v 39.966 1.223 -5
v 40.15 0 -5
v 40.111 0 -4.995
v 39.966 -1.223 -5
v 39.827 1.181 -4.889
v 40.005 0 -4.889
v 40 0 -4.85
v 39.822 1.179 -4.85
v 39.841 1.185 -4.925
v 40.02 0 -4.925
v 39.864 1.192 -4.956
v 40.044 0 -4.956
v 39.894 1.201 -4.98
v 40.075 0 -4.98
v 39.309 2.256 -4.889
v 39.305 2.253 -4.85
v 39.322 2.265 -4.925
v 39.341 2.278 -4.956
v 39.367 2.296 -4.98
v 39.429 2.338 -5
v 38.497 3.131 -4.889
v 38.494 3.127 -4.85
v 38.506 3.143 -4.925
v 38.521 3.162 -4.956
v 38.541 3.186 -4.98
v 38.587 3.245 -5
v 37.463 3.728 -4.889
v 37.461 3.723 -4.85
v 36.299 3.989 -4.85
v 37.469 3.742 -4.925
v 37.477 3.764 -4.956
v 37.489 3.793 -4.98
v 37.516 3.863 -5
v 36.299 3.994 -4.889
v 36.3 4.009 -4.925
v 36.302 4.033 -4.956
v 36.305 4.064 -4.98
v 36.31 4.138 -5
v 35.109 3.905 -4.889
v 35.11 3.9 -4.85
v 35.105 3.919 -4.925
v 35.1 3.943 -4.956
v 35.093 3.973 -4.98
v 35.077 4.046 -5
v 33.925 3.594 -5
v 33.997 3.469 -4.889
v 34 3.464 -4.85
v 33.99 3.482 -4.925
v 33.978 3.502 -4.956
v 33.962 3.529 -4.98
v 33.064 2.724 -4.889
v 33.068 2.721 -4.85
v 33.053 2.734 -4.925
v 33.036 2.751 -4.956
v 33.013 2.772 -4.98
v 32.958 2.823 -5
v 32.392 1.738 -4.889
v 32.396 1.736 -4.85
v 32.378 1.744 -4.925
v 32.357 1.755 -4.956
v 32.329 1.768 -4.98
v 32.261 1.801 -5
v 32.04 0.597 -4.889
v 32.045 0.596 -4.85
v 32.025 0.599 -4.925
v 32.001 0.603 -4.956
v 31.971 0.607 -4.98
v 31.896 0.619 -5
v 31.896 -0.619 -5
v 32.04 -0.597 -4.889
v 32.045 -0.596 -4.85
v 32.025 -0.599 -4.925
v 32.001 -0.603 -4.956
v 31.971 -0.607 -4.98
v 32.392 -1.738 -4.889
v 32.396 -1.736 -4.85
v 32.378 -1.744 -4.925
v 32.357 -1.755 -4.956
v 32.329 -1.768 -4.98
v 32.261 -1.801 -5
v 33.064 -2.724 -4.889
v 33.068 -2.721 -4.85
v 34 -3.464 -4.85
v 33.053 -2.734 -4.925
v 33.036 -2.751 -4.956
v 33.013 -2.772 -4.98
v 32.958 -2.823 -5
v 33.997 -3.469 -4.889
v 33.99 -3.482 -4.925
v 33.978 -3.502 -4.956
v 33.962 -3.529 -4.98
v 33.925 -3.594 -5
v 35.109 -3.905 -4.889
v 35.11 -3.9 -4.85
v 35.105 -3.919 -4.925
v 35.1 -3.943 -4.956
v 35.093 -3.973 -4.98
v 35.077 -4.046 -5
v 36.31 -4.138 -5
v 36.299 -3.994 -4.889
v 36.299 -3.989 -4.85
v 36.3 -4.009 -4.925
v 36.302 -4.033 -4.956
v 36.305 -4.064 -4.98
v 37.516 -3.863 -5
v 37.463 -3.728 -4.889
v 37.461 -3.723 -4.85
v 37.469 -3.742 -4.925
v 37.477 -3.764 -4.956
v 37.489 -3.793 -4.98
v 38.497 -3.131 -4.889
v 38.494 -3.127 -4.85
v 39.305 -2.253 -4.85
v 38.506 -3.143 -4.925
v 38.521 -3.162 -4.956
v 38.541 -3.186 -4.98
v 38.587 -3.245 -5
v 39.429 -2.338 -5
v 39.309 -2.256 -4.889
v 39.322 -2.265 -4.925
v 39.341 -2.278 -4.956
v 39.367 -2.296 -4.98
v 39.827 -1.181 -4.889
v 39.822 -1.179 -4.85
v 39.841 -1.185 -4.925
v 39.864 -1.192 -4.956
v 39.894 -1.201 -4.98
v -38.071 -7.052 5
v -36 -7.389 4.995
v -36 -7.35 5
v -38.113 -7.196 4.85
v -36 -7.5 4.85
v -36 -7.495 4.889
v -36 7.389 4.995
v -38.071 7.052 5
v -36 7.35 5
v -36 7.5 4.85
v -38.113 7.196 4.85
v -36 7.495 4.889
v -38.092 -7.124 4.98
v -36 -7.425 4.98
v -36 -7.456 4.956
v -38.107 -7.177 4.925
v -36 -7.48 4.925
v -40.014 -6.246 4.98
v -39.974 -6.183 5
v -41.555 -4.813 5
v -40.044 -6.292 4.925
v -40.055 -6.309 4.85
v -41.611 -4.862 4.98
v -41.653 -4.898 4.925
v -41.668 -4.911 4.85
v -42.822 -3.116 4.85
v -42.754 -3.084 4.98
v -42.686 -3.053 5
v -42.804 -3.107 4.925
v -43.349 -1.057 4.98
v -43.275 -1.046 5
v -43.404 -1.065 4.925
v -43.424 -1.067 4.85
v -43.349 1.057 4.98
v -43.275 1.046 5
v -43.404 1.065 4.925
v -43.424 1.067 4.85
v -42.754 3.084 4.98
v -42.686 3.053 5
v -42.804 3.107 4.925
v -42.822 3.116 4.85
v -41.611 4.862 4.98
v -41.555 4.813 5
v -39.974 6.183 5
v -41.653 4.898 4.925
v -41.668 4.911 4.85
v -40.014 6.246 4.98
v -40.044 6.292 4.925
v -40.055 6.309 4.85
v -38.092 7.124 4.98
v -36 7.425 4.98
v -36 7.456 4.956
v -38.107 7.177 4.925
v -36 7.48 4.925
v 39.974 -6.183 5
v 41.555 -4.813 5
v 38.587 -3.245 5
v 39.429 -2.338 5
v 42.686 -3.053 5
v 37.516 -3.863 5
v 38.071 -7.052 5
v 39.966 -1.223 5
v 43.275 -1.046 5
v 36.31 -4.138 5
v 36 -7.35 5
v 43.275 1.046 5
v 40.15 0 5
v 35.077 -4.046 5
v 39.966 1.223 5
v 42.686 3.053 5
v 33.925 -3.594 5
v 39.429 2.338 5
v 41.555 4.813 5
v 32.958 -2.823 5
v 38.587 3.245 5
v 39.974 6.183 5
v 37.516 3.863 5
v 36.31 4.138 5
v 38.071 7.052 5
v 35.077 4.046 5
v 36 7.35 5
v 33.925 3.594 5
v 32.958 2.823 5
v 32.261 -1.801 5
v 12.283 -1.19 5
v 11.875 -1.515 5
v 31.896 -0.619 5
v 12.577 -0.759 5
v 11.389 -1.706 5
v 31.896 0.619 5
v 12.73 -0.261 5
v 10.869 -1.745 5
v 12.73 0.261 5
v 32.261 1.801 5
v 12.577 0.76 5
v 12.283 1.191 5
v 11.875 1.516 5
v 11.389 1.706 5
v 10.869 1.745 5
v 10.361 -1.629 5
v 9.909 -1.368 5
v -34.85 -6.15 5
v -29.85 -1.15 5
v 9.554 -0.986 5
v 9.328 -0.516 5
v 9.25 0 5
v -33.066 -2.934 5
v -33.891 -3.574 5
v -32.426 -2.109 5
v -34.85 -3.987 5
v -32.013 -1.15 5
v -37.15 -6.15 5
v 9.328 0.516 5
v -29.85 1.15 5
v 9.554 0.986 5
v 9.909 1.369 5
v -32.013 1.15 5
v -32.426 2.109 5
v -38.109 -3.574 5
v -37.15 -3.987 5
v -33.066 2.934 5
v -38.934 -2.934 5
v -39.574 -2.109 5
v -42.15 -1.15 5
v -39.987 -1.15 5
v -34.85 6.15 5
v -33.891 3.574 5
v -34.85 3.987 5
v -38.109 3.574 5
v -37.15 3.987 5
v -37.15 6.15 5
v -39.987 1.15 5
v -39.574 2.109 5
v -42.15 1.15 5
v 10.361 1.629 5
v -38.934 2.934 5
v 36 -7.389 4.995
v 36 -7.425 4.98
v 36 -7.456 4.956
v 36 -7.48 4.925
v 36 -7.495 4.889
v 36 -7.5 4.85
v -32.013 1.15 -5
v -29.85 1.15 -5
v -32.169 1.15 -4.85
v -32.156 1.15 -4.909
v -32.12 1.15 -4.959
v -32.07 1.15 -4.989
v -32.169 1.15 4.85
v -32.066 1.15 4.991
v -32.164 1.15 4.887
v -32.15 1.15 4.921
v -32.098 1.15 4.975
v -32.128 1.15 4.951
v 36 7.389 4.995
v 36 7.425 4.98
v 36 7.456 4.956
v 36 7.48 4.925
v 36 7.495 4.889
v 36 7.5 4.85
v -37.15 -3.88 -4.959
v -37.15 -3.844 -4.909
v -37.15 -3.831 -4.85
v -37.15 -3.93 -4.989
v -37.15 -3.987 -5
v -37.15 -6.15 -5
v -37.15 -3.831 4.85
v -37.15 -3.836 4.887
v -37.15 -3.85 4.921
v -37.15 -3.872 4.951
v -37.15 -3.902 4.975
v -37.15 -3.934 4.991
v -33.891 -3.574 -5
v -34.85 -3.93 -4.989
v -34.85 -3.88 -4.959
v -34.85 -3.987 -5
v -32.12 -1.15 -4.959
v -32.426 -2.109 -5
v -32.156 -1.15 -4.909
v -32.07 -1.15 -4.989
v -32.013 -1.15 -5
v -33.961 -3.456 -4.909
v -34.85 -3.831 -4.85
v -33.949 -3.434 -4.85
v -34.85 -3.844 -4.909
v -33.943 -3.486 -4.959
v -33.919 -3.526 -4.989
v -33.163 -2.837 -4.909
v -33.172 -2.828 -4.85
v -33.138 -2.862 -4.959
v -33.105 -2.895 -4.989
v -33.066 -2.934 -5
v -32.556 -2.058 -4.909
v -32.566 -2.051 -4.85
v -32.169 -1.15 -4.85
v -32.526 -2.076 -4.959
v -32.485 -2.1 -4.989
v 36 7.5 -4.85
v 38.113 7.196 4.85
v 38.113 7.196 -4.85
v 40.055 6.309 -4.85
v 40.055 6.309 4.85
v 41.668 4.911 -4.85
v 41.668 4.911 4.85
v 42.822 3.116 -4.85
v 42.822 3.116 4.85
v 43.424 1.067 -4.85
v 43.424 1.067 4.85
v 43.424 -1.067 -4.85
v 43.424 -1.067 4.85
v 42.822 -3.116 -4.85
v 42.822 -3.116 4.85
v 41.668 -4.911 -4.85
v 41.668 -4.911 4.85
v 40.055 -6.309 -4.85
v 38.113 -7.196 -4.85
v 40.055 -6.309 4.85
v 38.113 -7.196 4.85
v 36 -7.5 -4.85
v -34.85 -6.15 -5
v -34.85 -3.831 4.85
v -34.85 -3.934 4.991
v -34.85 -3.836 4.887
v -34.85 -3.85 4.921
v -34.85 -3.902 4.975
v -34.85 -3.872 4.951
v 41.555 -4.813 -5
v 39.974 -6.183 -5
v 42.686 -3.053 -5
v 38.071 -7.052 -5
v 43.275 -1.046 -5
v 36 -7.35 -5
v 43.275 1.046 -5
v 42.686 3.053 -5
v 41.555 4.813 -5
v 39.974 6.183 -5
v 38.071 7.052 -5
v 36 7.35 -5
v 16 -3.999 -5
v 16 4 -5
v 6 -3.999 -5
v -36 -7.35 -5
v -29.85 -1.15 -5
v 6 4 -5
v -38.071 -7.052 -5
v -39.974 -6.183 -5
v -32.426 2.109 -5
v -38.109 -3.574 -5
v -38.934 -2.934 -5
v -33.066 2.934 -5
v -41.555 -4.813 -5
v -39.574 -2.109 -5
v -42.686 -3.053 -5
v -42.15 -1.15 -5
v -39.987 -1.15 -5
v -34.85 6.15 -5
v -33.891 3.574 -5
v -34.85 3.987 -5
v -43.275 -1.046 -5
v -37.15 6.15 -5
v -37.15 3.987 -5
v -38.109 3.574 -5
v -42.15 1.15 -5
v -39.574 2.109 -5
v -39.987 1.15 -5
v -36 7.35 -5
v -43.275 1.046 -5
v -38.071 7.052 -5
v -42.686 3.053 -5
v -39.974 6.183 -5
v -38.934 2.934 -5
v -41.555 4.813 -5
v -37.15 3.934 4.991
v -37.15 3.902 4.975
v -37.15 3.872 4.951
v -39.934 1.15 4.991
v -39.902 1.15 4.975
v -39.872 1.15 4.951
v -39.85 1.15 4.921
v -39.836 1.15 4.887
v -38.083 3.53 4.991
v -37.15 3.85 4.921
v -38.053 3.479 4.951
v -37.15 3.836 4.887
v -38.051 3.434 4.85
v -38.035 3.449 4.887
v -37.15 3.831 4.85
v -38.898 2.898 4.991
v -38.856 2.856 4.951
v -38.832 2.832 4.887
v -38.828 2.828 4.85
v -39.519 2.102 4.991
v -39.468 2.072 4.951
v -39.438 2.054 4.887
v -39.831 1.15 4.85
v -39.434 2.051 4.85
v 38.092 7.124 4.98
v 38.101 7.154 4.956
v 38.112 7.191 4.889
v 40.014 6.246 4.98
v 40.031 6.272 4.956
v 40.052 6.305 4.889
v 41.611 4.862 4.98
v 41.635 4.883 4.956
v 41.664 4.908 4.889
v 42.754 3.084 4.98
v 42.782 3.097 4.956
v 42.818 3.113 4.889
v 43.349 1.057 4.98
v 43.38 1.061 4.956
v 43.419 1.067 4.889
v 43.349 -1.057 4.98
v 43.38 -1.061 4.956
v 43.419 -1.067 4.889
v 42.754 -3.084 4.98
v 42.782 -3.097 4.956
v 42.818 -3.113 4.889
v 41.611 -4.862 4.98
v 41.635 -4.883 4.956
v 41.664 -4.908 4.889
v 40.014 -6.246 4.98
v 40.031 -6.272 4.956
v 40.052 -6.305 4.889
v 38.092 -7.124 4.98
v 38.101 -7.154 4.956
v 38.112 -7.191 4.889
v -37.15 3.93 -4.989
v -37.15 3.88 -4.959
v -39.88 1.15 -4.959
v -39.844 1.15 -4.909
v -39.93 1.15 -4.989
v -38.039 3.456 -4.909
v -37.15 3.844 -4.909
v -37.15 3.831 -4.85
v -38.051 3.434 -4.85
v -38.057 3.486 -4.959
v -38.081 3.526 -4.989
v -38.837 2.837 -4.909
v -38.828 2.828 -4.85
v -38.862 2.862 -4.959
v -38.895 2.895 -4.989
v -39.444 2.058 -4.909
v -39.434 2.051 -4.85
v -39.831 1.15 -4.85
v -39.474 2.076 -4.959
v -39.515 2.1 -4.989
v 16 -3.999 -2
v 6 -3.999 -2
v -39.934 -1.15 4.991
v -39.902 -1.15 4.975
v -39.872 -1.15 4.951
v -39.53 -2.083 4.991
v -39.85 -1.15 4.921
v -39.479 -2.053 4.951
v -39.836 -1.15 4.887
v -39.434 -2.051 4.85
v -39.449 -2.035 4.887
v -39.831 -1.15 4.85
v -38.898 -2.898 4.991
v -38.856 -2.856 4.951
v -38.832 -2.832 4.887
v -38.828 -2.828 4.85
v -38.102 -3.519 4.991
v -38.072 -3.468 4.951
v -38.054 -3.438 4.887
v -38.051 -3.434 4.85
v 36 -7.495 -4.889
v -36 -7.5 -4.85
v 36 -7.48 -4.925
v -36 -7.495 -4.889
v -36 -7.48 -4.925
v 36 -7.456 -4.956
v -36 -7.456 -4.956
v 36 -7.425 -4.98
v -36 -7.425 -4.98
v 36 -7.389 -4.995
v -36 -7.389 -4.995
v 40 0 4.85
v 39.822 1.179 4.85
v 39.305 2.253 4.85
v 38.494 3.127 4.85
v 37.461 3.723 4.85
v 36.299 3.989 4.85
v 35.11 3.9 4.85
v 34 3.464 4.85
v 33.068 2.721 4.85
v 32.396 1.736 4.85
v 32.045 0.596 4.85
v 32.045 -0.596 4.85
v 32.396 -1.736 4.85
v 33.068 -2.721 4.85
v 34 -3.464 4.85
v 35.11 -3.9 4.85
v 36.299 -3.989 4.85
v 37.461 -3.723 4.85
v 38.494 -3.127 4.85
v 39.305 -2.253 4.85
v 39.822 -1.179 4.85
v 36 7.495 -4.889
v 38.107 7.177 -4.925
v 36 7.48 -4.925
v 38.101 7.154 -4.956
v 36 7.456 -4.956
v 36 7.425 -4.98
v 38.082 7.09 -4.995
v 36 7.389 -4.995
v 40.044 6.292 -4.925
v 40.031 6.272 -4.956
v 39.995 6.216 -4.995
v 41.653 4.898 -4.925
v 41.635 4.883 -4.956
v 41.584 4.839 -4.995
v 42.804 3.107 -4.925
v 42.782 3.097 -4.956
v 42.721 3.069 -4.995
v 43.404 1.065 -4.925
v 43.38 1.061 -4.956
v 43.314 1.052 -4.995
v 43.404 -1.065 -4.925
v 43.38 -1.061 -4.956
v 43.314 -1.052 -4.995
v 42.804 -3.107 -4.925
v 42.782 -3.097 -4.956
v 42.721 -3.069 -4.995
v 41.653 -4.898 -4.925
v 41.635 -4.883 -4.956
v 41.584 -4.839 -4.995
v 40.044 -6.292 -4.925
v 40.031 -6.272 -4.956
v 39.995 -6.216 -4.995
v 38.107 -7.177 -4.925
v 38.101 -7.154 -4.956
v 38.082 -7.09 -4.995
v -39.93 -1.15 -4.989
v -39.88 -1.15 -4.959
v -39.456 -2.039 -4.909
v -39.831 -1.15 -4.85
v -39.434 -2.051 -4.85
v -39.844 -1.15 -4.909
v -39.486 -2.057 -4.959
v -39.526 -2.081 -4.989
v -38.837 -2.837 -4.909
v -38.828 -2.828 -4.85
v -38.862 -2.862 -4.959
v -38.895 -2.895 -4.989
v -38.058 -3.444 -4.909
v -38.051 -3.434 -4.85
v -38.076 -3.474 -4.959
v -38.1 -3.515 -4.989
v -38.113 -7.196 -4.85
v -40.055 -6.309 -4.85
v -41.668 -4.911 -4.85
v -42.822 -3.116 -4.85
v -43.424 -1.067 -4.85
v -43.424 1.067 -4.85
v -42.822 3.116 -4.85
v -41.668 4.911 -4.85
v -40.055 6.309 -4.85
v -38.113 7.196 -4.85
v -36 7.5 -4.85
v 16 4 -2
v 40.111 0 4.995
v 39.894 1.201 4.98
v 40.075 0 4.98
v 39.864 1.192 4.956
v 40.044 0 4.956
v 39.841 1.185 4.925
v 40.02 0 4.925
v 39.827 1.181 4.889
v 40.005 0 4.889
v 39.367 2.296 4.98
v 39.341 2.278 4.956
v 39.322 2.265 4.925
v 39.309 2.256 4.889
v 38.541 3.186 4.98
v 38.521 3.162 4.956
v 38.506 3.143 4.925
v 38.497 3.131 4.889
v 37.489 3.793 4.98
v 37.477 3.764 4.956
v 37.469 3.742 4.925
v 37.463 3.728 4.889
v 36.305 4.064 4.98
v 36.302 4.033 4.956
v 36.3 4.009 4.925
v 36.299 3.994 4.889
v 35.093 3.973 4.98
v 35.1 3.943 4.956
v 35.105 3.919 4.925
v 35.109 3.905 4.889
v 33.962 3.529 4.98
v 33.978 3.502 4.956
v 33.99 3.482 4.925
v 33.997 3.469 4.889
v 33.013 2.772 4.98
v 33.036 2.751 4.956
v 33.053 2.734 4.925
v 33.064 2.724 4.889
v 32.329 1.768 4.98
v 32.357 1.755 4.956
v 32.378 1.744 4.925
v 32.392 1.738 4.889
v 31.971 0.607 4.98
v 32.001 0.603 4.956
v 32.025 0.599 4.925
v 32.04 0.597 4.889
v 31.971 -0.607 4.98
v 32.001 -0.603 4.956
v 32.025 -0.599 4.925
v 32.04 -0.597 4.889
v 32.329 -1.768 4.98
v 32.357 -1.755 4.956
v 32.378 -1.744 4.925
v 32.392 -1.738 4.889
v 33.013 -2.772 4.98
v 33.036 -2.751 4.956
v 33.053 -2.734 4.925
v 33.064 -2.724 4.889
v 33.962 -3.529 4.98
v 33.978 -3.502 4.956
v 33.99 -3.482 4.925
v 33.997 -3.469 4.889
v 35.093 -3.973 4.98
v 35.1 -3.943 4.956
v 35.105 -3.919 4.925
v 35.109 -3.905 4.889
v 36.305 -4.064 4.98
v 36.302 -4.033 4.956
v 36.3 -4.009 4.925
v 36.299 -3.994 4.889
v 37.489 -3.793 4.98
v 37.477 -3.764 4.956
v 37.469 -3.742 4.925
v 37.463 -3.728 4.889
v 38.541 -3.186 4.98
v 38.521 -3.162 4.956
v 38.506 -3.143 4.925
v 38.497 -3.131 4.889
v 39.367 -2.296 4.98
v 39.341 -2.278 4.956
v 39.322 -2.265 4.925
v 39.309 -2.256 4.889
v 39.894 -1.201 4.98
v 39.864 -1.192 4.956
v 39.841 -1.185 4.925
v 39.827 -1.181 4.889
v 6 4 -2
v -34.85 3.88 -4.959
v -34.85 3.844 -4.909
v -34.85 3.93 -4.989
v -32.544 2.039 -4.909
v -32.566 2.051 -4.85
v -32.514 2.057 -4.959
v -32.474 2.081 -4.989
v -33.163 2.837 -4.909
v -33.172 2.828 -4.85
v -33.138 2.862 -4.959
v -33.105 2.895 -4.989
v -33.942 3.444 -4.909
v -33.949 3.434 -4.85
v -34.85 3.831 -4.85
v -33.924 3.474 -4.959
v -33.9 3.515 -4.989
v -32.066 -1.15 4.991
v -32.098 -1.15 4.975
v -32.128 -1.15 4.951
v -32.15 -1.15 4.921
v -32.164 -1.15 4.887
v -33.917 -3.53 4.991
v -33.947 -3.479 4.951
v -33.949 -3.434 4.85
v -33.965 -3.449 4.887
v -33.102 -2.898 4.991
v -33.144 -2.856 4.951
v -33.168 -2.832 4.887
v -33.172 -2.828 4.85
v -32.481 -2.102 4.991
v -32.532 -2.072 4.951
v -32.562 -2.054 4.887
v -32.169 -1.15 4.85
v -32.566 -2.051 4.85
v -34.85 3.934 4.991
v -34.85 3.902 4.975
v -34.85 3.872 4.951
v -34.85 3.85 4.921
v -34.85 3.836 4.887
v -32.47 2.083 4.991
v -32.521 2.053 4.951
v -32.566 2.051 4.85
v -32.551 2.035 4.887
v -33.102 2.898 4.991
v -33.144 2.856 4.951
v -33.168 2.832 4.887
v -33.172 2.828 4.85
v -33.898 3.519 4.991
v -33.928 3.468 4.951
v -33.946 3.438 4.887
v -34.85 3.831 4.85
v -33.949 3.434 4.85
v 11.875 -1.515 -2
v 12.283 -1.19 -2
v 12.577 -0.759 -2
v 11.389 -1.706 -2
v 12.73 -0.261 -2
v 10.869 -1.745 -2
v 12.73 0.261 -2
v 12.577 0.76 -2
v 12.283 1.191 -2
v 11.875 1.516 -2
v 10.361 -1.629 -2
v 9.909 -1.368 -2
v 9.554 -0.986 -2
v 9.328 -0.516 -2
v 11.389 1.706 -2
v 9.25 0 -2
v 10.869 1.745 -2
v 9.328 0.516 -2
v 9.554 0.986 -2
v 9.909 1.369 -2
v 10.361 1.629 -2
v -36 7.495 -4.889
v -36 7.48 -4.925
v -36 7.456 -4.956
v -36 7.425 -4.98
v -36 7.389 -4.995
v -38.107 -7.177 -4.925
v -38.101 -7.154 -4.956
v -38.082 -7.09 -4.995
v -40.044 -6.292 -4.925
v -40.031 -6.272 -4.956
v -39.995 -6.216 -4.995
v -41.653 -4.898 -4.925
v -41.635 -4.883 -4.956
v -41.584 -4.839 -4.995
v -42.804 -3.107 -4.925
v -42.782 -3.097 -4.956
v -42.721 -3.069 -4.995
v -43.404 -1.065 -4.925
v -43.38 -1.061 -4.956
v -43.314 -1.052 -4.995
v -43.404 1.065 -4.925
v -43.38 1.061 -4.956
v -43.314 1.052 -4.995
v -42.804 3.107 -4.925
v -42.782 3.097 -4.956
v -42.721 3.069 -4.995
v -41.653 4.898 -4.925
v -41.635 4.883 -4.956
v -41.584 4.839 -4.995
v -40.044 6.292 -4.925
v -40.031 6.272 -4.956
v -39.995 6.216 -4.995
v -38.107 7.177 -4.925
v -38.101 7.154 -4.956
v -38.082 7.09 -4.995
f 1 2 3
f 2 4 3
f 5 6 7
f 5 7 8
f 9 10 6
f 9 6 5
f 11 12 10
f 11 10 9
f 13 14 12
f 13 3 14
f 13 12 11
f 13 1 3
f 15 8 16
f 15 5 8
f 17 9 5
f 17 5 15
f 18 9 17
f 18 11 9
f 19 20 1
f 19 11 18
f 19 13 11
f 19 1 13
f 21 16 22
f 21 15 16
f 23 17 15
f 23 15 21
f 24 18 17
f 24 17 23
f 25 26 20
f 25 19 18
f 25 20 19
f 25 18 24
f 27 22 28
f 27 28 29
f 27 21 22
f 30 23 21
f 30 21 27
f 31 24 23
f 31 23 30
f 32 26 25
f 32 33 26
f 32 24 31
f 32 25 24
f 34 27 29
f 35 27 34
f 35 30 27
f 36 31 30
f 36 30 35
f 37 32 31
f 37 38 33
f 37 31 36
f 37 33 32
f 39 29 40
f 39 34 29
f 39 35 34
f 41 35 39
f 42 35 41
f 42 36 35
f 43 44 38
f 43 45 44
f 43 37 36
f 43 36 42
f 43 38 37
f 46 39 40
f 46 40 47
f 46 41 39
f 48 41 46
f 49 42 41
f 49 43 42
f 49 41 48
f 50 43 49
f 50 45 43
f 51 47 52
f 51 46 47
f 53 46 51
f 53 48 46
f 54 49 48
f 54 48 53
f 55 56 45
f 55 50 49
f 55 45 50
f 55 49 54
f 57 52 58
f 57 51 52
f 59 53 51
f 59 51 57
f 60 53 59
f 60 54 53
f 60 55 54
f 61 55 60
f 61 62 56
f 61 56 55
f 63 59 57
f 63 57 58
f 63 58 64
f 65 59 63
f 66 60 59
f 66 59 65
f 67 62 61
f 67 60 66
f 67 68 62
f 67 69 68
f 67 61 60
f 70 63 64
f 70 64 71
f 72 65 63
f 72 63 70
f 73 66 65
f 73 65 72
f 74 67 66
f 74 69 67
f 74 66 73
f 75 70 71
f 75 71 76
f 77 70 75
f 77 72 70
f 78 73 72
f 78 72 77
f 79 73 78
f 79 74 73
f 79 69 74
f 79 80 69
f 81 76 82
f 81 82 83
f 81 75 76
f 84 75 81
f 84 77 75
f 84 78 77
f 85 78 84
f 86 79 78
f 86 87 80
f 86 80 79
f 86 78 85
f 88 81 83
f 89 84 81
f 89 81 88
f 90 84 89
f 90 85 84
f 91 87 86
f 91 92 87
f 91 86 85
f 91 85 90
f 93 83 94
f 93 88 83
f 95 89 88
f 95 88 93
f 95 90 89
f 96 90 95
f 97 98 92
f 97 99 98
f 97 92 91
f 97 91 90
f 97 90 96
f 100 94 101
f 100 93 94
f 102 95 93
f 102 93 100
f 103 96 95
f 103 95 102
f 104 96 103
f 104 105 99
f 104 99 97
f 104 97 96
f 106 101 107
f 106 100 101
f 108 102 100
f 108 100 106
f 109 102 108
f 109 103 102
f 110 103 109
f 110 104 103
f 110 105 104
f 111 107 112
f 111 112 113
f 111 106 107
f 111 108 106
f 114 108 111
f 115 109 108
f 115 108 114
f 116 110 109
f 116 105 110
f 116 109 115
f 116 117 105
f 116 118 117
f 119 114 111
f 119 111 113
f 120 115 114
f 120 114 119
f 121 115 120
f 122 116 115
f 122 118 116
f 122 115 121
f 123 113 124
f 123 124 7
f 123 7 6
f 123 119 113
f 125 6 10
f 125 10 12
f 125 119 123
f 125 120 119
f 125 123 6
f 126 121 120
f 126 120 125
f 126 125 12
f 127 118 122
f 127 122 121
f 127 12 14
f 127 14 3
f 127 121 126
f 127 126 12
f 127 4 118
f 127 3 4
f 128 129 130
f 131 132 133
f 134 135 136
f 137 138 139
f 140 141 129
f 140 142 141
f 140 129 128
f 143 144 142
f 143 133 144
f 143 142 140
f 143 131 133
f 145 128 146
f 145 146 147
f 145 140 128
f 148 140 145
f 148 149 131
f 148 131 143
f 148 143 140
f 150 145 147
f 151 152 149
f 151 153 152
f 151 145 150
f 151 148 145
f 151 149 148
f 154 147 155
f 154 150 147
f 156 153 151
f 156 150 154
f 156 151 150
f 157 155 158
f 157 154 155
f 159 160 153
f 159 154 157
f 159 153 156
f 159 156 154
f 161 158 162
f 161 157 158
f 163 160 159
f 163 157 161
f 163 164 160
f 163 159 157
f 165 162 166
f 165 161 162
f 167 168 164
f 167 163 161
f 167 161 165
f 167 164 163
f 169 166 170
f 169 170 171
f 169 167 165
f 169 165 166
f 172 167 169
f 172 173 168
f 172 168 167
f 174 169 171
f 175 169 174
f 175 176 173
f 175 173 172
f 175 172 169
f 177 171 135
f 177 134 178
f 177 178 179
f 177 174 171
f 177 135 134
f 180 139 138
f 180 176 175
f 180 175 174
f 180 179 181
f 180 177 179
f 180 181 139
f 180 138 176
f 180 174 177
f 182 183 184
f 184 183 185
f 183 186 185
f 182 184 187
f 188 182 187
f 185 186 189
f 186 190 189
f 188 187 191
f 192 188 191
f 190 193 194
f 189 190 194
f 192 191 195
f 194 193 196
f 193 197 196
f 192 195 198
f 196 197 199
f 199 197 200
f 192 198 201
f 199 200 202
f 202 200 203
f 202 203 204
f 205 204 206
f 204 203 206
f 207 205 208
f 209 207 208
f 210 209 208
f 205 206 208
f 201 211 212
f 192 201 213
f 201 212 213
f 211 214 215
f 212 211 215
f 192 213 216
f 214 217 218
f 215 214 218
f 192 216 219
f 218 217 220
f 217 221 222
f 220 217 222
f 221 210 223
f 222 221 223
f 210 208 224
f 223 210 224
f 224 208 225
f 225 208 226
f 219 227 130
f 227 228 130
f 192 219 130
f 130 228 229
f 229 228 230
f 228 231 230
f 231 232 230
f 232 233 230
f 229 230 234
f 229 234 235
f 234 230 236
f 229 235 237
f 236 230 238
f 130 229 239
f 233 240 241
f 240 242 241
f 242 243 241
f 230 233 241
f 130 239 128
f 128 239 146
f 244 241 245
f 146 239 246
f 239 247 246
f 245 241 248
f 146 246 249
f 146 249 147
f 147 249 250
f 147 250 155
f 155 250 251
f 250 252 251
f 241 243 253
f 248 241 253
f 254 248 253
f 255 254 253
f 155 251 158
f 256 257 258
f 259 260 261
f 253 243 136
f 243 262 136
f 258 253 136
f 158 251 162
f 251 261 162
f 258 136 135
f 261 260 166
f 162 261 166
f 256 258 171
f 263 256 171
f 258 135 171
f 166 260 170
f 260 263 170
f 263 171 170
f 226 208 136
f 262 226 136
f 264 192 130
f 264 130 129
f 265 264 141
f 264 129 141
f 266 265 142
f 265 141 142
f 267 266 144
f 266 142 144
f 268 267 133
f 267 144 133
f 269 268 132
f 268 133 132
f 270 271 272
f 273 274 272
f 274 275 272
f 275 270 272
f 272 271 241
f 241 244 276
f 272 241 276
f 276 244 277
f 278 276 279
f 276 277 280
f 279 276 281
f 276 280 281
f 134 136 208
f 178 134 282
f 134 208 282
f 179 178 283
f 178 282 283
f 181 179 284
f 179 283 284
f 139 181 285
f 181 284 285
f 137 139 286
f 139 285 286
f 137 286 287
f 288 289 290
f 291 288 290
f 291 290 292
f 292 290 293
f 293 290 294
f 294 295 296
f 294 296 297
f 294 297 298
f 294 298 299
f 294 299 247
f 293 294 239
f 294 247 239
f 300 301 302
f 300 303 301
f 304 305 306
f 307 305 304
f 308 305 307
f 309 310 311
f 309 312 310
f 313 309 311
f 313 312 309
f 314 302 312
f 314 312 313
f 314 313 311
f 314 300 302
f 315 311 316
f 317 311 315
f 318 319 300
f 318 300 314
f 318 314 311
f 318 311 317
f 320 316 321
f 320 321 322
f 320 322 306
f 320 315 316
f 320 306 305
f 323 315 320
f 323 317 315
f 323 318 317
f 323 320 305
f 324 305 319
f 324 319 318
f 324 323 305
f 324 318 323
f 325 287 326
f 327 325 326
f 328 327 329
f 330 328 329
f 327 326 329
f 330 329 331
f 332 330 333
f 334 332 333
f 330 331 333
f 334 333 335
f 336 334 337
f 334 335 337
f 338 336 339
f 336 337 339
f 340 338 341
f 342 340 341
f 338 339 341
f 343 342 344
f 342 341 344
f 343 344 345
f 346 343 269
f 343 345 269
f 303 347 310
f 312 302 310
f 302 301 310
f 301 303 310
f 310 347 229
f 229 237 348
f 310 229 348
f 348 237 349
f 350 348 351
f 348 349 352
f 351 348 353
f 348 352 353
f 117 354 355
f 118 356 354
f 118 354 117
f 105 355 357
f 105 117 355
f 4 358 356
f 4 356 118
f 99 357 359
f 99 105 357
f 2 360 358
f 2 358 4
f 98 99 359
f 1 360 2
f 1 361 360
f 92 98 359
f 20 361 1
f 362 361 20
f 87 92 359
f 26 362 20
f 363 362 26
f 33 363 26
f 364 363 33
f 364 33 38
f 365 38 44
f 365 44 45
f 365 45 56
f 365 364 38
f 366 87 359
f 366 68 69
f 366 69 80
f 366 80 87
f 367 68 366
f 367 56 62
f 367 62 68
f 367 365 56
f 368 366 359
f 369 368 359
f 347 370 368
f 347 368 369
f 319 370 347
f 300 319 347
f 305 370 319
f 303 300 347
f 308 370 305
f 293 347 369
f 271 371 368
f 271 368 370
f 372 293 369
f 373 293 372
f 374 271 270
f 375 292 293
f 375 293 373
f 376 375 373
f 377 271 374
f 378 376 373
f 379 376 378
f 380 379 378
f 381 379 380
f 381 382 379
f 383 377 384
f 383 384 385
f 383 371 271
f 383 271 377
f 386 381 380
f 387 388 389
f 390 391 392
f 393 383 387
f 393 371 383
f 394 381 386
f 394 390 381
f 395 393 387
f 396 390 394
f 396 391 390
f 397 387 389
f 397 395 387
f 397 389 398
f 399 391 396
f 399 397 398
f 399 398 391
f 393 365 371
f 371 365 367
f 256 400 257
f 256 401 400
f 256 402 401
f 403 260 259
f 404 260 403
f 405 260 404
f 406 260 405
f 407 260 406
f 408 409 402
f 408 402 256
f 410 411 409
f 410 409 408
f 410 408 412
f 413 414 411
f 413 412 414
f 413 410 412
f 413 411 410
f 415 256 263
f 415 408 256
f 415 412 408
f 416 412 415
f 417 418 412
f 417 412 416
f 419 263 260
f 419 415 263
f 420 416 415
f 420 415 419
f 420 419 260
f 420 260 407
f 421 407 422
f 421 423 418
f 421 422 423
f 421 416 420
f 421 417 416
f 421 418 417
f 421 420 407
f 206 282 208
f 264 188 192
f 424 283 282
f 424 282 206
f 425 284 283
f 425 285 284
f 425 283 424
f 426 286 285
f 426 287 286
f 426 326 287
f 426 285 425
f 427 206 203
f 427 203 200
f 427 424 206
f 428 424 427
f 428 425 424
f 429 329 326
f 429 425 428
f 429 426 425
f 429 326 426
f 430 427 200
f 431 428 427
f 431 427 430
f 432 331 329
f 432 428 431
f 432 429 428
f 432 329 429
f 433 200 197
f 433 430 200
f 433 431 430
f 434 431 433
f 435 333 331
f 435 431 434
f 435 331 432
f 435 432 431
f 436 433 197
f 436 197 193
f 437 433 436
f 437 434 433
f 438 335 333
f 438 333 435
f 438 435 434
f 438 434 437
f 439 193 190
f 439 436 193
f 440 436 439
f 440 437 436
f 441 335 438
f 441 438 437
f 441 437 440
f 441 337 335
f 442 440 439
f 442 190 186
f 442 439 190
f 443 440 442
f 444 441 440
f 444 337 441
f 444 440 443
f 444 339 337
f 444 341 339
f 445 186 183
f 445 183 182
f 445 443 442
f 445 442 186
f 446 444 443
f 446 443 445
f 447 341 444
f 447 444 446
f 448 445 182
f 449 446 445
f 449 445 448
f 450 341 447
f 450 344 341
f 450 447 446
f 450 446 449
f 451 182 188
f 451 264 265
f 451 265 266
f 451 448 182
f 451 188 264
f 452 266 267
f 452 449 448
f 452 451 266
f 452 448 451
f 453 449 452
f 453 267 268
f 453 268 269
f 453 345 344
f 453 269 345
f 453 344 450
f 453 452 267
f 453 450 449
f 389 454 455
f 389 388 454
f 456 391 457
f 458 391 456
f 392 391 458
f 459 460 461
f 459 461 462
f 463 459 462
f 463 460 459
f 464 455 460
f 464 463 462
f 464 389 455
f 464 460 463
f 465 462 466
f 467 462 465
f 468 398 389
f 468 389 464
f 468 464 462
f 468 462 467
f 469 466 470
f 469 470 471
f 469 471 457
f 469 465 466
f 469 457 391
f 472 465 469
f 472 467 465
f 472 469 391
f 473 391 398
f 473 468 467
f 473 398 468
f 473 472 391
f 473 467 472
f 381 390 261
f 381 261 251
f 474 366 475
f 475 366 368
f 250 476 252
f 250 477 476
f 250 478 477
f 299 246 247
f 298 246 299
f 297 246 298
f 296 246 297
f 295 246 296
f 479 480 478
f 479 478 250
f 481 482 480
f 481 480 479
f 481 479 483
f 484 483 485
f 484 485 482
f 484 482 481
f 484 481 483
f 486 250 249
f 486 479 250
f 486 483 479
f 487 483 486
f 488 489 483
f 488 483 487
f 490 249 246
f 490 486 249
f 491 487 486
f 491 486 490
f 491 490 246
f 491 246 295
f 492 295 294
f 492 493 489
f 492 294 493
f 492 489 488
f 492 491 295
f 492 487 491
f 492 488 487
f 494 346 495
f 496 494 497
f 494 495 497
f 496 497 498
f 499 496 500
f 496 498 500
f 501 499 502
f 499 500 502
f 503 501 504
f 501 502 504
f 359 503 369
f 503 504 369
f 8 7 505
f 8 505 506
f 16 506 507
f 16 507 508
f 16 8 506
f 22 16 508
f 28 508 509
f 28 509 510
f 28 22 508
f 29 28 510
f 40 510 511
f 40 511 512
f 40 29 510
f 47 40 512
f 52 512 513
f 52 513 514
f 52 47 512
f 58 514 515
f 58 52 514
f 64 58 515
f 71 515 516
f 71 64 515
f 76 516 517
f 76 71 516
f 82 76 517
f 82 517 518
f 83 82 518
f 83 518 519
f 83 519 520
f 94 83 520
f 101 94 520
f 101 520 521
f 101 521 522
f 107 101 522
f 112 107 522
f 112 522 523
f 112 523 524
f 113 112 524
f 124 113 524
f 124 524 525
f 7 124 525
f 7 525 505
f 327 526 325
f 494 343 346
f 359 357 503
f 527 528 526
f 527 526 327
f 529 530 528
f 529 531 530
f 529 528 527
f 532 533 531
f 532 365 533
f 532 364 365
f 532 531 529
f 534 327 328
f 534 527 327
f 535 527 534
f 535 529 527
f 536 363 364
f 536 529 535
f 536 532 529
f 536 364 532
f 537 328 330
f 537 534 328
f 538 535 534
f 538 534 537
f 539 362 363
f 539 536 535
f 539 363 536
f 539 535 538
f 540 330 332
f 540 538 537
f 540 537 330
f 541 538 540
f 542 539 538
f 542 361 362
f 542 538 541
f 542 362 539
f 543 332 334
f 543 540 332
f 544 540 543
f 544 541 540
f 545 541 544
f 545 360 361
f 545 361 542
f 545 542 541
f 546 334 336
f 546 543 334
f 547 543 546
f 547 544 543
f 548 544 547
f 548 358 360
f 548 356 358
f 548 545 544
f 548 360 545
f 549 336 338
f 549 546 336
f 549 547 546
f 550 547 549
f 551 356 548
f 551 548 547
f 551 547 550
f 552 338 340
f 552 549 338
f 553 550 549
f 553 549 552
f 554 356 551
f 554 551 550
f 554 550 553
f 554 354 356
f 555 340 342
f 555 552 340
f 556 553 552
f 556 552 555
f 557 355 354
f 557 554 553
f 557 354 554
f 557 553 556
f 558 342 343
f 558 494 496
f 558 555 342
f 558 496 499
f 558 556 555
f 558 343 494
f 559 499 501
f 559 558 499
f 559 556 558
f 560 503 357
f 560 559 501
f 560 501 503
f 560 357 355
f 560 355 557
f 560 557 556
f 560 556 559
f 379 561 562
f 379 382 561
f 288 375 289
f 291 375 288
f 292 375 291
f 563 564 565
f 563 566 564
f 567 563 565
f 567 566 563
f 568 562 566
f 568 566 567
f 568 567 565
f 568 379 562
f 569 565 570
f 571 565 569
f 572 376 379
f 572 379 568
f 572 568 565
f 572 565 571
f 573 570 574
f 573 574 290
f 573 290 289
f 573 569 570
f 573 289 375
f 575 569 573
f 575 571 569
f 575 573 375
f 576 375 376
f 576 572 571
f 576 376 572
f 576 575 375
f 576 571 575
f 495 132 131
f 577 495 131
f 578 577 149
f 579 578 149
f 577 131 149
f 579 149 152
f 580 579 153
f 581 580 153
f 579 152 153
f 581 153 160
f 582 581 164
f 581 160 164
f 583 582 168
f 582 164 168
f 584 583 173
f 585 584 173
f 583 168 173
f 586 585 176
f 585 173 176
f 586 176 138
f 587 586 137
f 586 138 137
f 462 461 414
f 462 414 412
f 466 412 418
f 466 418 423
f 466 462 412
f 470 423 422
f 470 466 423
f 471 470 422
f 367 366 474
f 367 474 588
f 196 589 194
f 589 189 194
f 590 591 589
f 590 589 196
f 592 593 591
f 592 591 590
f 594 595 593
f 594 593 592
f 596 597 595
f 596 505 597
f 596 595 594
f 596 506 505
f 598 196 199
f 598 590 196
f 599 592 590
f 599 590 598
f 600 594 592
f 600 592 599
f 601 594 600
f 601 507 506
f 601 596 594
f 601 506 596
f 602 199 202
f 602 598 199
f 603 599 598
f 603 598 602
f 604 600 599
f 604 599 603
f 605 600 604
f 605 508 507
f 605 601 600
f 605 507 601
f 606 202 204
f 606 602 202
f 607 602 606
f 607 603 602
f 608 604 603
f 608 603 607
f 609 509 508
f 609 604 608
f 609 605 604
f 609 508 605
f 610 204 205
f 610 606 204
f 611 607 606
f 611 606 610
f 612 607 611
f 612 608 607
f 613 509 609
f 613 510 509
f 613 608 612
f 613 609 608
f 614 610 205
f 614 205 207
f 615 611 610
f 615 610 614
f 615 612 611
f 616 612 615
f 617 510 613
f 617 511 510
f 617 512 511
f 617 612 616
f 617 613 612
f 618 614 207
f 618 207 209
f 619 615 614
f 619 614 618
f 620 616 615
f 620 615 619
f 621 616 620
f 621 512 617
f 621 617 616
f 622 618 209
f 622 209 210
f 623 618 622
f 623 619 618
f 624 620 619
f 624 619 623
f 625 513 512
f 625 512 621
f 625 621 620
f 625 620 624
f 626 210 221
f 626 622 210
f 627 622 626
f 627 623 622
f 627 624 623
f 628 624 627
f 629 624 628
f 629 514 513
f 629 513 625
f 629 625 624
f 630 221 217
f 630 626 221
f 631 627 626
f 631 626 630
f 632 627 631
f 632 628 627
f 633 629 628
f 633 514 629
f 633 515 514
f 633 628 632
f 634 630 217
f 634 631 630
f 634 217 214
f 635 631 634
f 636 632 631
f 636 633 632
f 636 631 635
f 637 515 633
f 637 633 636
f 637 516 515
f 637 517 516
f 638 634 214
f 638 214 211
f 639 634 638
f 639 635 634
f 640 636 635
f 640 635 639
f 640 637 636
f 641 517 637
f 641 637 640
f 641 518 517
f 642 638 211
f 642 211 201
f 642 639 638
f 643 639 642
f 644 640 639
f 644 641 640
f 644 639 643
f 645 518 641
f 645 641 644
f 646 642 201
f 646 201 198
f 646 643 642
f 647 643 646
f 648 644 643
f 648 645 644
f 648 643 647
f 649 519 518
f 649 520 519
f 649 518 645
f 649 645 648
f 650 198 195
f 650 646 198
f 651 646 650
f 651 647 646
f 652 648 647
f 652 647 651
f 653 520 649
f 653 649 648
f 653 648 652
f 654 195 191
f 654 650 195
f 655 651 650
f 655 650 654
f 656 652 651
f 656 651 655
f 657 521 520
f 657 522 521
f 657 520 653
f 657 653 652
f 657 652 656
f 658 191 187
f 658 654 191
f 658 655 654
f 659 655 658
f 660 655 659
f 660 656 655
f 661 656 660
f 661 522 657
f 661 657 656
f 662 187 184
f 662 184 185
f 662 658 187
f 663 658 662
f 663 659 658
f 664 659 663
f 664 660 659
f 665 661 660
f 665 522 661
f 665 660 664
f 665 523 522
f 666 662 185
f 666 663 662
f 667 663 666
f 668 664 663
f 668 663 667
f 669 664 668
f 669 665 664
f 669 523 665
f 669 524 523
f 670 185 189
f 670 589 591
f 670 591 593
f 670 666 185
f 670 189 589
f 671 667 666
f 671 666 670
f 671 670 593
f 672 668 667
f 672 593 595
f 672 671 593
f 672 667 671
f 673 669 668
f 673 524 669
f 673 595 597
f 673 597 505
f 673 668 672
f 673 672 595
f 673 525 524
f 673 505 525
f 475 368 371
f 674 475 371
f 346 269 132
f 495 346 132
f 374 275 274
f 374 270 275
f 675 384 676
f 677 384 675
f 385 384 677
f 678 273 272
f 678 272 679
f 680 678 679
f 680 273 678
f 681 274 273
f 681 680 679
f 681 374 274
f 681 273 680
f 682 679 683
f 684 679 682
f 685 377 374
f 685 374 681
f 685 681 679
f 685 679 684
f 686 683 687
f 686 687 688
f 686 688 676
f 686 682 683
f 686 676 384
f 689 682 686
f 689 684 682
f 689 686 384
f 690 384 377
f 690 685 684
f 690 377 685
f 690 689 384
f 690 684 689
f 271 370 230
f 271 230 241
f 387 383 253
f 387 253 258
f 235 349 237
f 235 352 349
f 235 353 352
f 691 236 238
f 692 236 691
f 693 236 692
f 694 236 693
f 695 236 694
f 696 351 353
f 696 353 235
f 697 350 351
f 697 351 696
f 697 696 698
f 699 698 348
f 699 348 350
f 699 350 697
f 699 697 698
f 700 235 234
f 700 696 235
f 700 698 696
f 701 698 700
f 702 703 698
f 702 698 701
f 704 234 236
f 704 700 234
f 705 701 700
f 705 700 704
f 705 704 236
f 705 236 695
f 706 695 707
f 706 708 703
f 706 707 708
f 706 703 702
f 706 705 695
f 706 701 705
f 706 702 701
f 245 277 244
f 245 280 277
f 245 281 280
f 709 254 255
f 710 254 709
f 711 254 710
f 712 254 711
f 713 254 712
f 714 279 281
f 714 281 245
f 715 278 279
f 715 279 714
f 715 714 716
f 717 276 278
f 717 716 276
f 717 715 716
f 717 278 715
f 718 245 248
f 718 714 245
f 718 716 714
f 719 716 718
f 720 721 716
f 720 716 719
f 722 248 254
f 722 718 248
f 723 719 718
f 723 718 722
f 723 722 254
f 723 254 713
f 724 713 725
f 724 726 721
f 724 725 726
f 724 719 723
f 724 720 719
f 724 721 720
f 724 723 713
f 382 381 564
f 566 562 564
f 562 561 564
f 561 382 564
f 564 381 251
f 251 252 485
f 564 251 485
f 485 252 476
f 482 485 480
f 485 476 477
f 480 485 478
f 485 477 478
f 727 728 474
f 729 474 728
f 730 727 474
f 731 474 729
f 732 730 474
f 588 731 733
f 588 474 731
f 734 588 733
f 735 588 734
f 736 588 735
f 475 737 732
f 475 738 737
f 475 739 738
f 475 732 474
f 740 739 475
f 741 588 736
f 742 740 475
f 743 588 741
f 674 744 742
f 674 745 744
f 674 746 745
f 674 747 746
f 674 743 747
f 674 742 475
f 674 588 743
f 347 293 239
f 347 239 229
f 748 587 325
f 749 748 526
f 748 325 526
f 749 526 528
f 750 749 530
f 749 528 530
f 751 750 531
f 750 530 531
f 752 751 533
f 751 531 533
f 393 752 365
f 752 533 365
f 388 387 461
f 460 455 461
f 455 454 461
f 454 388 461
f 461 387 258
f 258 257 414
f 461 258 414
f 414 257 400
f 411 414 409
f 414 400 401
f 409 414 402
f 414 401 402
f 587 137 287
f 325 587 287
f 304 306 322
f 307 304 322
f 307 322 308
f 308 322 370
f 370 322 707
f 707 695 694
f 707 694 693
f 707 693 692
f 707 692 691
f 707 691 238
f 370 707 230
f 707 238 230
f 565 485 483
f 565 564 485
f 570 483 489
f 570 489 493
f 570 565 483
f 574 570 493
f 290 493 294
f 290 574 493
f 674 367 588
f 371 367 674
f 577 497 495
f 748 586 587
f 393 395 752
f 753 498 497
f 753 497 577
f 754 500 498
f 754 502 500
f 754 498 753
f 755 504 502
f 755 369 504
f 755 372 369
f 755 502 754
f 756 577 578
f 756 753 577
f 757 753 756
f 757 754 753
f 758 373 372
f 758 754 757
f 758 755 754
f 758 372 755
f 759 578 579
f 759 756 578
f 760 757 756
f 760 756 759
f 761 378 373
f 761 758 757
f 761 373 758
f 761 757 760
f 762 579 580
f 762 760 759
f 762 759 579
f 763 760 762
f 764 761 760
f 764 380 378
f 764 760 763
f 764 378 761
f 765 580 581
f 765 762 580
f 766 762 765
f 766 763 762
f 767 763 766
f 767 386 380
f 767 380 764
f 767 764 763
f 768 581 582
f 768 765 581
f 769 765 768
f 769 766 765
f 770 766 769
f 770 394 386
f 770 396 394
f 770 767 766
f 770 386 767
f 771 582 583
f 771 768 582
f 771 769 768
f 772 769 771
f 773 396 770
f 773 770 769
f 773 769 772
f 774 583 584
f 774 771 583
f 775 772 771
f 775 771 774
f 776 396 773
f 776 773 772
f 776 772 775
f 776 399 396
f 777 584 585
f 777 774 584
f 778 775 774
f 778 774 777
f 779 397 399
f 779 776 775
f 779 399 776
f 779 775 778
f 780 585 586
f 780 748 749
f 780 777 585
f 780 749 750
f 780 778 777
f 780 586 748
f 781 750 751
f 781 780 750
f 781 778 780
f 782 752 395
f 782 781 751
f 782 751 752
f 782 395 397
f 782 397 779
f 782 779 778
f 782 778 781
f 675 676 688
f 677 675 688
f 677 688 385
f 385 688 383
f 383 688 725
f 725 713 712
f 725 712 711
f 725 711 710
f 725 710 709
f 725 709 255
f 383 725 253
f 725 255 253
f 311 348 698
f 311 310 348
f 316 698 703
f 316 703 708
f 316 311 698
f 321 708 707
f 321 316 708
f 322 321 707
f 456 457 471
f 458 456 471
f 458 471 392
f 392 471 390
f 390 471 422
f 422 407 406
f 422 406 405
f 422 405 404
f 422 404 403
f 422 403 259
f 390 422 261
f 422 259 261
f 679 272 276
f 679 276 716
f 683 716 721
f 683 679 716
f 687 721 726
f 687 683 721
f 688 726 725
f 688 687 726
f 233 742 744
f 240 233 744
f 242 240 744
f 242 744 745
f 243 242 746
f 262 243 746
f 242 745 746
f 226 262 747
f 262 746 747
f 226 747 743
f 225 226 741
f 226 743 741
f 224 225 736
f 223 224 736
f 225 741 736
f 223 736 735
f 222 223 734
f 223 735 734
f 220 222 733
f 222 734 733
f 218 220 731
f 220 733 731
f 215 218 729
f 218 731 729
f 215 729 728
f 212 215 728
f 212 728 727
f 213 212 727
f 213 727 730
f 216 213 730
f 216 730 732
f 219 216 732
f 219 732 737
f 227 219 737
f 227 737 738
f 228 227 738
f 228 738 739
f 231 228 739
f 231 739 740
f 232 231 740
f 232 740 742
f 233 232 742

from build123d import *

# Parameters (mm, degrees)
SKETCH1_R           = 4
BOSS_EXTRUDE1_DEPTH = 5
FILLET2_R           = 0.15
SKETCH2_W           = 10
SKETCH2_H           = 7.9994
CUT_EXTRUDE1_DEPTH  = 3
SKETCH3_R           = 1.75
CUT_EXTRUDE2_DEPTH  = 45.69339996
CUT_EXTRUDE3_DEPTH  = 46.260357931


with BuildPart() as part:
    # Sketch1 → Boss-Extrude1 (new, symmetric)
    with BuildSketch(Plane.XY):
        with BuildLine():
            Line((-35.999998845, 7.5), (35.999998845, 7.5))
            ThreePointArc((35.999998845, 7.5), (43.5, 0), (35.999998845, -7.5))
            Line((35.999998845, -7.5), (-35.999998845, -7.5))
            ThreePointArc((-35.999998845, -7.5), (-43.5, 0), (-35.999998845, 7.5))
        make_face()
        with Locations((-36, 0)):
            Circle(SKETCH1_R, mode=Mode.SUBTRACT)
        with Locations((36, 0)):
            Circle(SKETCH1_R, mode=Mode.SUBTRACT)
    extrude(amount=BOSS_EXTRUDE1_DEPTH, both=True)

    # Fillet2
    fillet2_edges = [part.edges().sort_by_distance(p)[0] for p in [
        (-40, 0, -5),
        (-40, 0, 5),
        (-43.5, 0, 5),
        (32, 0, -5),
        (32, 0, 5),
        (0, -7.5, 5),
        (43.5, 0, 5),
        (0, -7.5, -5),
        (-43.5, 0, -5),
        (0, 7.5, -5),
        (43.5, 0, -5),
        (0, 7.5, 5),
    ]]
    fillet(fillet2_edges, radius=FILLET2_R)

    # Sketch2 → Cut-Extrude1 (cut)
    with BuildSketch(Plane(origin=(0, 0, -5), x_dir=(-1, 0, 0), z_dir=(0, 0, -1))):
        with Locations((-11, 0.0003)):
            Rectangle(SKETCH2_W, SKETCH2_H)
    extrude(amount=-CUT_EXTRUDE1_DEPTH, mode=Mode.SUBTRACT)

    # Sketch3 → Cut-Extrude2 (cut, through all)
    with BuildSketch(Plane(origin=(0, 0, -2), x_dir=(-1, 0, 0), z_dir=(0, 0, -1))):
        with Locations((-11, 0.0003)):
            Circle(SKETCH3_R)
    extrude(amount=-CUT_EXTRUDE2_DEPTH, mode=Mode.SUBTRACT)

    # Sketch4 → Cut-Extrude3 (cut, through all)
    with BuildSketch(Plane.XY.offset(5)):
        with BuildLine():
            Line((-29.85, 1.15), (-32.168877449, 1.15))
            ThreePointArc((-32.168877449, 1.15), (-33.171572875, 2.828427125), (-34.85, 3.831122551))
            Line((-34.85, 3.831122551), (-34.85, 6.15))
            Line((-34.85, 6.15), (-37.15, 6.15))
            Line((-37.15, 6.15), (-37.15, 3.831122551))
            ThreePointArc((-37.15, 3.831122551), (-38.828427125, 2.828427125), (-39.831122551, 1.15))
            Line((-39.831122551, 1.15), (-42.15, 1.15))
            Line((-42.15, 1.15), (-42.15, -1.15))
            Line((-42.15, -1.15), (-39.831122551, -1.15))
            ThreePointArc((-39.831122551, -1.15), (-38.828427125, -2.828427125), (-37.15, -3.831122551))
            Line((-37.15, -3.831122551), (-37.15, -6.15))
            Line((-37.15, -6.15), (-34.85, -6.15))
            Line((-34.85, -6.15), (-34.85, -3.831122551))
            ThreePointArc((-34.85, -3.831122551), (-33.171572875, -2.828427125), (-32.168877449, -1.15))
            Line((-32.168877449, -1.15), (-29.85, -1.15))
            Line((-29.85, -1.15), (-29.85, 1.15))
        make_face()
    extrude(amount=-CUT_EXTRUDE3_DEPTH, mode=Mode.SUBTRACT)


solid = part.part
